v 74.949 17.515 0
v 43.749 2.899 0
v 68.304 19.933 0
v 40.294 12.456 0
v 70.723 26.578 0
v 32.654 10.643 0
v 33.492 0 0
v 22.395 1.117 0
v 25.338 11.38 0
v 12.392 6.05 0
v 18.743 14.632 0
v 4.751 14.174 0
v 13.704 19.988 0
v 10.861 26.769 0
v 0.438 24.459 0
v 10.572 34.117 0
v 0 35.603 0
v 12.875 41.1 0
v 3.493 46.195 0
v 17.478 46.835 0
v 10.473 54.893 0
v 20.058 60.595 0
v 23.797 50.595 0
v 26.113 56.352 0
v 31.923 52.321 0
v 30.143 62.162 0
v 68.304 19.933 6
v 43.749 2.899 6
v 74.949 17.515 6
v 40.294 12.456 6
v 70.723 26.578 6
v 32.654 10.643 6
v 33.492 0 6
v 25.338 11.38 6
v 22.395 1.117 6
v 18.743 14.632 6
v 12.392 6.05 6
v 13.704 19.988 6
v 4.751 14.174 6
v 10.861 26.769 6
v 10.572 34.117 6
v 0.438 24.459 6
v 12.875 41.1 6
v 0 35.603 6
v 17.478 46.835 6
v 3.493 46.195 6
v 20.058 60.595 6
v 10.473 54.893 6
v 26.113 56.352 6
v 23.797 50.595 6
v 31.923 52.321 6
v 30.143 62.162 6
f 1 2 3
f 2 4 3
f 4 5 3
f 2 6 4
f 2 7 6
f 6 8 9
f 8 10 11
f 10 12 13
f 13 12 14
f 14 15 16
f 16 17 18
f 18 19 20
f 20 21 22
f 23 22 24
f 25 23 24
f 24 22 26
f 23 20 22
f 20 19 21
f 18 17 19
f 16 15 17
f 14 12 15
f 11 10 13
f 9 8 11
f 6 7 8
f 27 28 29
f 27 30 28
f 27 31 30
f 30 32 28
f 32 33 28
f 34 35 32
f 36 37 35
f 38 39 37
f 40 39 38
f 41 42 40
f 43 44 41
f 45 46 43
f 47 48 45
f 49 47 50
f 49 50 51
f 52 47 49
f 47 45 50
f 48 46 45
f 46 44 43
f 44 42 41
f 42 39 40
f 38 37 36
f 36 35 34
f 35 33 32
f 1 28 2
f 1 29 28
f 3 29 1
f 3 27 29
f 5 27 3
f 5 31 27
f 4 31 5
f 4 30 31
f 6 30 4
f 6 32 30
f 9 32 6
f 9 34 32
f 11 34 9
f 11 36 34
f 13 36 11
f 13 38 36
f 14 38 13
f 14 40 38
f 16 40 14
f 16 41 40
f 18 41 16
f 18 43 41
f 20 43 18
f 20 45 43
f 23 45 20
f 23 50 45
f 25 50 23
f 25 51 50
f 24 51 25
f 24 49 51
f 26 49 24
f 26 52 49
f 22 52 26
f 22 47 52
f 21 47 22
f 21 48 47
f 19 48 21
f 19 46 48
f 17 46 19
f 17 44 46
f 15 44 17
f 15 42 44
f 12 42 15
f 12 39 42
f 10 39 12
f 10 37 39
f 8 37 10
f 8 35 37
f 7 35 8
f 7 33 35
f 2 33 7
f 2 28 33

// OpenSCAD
$fn = 32;

// ----------------------------------------------------------------------
// Hook plate: curl radius 26 mm over 205 degrees, 10 mm thick band
// ----------------------------------------------------------------------

// --- parameters (mm) ---
profile_height = 6;       // extrusion height
profile_points = 26;      // points of the closed outline

profile = [[26.113, 56.352], [30.143, 62.162], [20.058, 60.595], [10.473, 54.893], [3.493, 46.195], [0, 35.603], [0.438, 24.459], [4.751, 14.174], [12.392, 6.05], [22.395, 1.117], [33.492, 0], [43.749, 2.899], [74.949, 17.515], [68.304, 19.933], [70.723, 26.578], [40.294, 12.456], [32.654, 10.643], [25.338, 11.38], [18.743, 14.632], [13.704, 19.988], [10.861, 26.769], [10.572, 34.117], [12.875, 41.1], [17.478, 46.835], [23.797, 50.595], [31.923, 52.321]];  // single closed polygon, 26 points, counter clockwise

// --- the one profile operation ---
linear_extrude(height = profile_height) polygon(points = profile);
